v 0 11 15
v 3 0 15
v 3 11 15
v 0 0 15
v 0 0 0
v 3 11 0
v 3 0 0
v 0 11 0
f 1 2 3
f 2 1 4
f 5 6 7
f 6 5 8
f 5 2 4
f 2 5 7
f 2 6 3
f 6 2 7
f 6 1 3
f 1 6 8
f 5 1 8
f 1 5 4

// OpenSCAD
// Generated by SolidPython 1.0.1 on 2020-07-29 00:39:26


cube(size = [3, 11, 15]);
/***********************************************
*********      SolidPython code:      **********
************************************************
 
# import packages: SolidPython
from solid import *
from solid.utils import *
from itertools import chain, combinations


class Resize:

    def __init__(self, scad_file):
        self.scad_file = scad_file
        #self.scad_file = import_scad(scad_file)
        # cone/cylinder param:
        self.r1 = 0
        self.r2 = 0
        self.h = 0
        # rectangular prism param:
        self.w = 0
        self.l = 0
        # ellipse param:
        self.r = 0

    # import OpenScad code (file name corresponds to shape)


    # classify shape + parameters
    def assign(self, param1, param2, param3):
        if self.scad_file == 'cone.scad':
            self.r1 = param1
            self.r2 = param2
            self.h = param3
        elif self.scad_file == 'cylinder.scad':
            self.r1 = param1
            self.r2 = param2
            self.h = param3
        elif self.scad_file == 'rectangularPrism.scad':
            self.h = param1
            self.l = param2
            self.w = param3
        else:
            self.r = param1
            self.h = param2

    # resize parameters
    def iterate(self):
        x = range(3, 20, 2)
        i = 1
        if self.scad_file == 'cone.scad':
            tempList = list(combinations(x, 2))
            for temp in tempList:
                param1 = temp[0]
                param2 = temp[1]
                filepath = 'produced_scad_files/' + 'cone' + str(param1) + '_' + str(param2) + '_' + '.scad'
                scad_render_to_file(cylinder(h=param1, r1=param2, r2=0), filepath)

        elif self.scad_file == 'cylinder.scad':
            tempList = list(combinations(x, 3))
            for temp in tempList:
                param1 = temp[0]
                param2 = temp[1]
                filepath = 'produced_scad_files/' + 'cylinder' + str(param1) + '_' + str(param2) + '_' + '.scad'
                scad_render_to_file(cylinder(h=param1, r1=param2, r2=param2), filepath)

        elif self.scad_file == 'rectangularPrism.scad':
            tempList = list(combinations(x, 3))
            for temp in tempList:
                param1 = temp[0]
                param2 = temp[1]
                param3 = temp[2]
                filepath = 'produced_scad_files/' + 'rectangularPrism' + str(param1) + '_' + str(param2) + '_' + str(
                    param3) + '.scad'
                scad_render_to_file(cube(size=(param1, param2, param3)), filepath)

        elif self.scad_file == 'ellipse.scad':
            tempList = list(combinations(x, 4))
            for temp in tempList:
                param1 = temp[0]
                param2 = temp[1]
                param3 = temp[2]
                param4 = temp[3]
                filepath = 'produced_scad_files/' + 'ellipse' + str(param1) + '_' + str(param2) + '_' + str(param3) + '_' + str(param4) + '.scad'
                scad_render_to_file(scale([param1, param2, param3])(sphere(r=param4)), filepath)

    def render_to_scadfile(self):
        scad_render_to_file(scad, 'example.scad') 
 
************************************************/
